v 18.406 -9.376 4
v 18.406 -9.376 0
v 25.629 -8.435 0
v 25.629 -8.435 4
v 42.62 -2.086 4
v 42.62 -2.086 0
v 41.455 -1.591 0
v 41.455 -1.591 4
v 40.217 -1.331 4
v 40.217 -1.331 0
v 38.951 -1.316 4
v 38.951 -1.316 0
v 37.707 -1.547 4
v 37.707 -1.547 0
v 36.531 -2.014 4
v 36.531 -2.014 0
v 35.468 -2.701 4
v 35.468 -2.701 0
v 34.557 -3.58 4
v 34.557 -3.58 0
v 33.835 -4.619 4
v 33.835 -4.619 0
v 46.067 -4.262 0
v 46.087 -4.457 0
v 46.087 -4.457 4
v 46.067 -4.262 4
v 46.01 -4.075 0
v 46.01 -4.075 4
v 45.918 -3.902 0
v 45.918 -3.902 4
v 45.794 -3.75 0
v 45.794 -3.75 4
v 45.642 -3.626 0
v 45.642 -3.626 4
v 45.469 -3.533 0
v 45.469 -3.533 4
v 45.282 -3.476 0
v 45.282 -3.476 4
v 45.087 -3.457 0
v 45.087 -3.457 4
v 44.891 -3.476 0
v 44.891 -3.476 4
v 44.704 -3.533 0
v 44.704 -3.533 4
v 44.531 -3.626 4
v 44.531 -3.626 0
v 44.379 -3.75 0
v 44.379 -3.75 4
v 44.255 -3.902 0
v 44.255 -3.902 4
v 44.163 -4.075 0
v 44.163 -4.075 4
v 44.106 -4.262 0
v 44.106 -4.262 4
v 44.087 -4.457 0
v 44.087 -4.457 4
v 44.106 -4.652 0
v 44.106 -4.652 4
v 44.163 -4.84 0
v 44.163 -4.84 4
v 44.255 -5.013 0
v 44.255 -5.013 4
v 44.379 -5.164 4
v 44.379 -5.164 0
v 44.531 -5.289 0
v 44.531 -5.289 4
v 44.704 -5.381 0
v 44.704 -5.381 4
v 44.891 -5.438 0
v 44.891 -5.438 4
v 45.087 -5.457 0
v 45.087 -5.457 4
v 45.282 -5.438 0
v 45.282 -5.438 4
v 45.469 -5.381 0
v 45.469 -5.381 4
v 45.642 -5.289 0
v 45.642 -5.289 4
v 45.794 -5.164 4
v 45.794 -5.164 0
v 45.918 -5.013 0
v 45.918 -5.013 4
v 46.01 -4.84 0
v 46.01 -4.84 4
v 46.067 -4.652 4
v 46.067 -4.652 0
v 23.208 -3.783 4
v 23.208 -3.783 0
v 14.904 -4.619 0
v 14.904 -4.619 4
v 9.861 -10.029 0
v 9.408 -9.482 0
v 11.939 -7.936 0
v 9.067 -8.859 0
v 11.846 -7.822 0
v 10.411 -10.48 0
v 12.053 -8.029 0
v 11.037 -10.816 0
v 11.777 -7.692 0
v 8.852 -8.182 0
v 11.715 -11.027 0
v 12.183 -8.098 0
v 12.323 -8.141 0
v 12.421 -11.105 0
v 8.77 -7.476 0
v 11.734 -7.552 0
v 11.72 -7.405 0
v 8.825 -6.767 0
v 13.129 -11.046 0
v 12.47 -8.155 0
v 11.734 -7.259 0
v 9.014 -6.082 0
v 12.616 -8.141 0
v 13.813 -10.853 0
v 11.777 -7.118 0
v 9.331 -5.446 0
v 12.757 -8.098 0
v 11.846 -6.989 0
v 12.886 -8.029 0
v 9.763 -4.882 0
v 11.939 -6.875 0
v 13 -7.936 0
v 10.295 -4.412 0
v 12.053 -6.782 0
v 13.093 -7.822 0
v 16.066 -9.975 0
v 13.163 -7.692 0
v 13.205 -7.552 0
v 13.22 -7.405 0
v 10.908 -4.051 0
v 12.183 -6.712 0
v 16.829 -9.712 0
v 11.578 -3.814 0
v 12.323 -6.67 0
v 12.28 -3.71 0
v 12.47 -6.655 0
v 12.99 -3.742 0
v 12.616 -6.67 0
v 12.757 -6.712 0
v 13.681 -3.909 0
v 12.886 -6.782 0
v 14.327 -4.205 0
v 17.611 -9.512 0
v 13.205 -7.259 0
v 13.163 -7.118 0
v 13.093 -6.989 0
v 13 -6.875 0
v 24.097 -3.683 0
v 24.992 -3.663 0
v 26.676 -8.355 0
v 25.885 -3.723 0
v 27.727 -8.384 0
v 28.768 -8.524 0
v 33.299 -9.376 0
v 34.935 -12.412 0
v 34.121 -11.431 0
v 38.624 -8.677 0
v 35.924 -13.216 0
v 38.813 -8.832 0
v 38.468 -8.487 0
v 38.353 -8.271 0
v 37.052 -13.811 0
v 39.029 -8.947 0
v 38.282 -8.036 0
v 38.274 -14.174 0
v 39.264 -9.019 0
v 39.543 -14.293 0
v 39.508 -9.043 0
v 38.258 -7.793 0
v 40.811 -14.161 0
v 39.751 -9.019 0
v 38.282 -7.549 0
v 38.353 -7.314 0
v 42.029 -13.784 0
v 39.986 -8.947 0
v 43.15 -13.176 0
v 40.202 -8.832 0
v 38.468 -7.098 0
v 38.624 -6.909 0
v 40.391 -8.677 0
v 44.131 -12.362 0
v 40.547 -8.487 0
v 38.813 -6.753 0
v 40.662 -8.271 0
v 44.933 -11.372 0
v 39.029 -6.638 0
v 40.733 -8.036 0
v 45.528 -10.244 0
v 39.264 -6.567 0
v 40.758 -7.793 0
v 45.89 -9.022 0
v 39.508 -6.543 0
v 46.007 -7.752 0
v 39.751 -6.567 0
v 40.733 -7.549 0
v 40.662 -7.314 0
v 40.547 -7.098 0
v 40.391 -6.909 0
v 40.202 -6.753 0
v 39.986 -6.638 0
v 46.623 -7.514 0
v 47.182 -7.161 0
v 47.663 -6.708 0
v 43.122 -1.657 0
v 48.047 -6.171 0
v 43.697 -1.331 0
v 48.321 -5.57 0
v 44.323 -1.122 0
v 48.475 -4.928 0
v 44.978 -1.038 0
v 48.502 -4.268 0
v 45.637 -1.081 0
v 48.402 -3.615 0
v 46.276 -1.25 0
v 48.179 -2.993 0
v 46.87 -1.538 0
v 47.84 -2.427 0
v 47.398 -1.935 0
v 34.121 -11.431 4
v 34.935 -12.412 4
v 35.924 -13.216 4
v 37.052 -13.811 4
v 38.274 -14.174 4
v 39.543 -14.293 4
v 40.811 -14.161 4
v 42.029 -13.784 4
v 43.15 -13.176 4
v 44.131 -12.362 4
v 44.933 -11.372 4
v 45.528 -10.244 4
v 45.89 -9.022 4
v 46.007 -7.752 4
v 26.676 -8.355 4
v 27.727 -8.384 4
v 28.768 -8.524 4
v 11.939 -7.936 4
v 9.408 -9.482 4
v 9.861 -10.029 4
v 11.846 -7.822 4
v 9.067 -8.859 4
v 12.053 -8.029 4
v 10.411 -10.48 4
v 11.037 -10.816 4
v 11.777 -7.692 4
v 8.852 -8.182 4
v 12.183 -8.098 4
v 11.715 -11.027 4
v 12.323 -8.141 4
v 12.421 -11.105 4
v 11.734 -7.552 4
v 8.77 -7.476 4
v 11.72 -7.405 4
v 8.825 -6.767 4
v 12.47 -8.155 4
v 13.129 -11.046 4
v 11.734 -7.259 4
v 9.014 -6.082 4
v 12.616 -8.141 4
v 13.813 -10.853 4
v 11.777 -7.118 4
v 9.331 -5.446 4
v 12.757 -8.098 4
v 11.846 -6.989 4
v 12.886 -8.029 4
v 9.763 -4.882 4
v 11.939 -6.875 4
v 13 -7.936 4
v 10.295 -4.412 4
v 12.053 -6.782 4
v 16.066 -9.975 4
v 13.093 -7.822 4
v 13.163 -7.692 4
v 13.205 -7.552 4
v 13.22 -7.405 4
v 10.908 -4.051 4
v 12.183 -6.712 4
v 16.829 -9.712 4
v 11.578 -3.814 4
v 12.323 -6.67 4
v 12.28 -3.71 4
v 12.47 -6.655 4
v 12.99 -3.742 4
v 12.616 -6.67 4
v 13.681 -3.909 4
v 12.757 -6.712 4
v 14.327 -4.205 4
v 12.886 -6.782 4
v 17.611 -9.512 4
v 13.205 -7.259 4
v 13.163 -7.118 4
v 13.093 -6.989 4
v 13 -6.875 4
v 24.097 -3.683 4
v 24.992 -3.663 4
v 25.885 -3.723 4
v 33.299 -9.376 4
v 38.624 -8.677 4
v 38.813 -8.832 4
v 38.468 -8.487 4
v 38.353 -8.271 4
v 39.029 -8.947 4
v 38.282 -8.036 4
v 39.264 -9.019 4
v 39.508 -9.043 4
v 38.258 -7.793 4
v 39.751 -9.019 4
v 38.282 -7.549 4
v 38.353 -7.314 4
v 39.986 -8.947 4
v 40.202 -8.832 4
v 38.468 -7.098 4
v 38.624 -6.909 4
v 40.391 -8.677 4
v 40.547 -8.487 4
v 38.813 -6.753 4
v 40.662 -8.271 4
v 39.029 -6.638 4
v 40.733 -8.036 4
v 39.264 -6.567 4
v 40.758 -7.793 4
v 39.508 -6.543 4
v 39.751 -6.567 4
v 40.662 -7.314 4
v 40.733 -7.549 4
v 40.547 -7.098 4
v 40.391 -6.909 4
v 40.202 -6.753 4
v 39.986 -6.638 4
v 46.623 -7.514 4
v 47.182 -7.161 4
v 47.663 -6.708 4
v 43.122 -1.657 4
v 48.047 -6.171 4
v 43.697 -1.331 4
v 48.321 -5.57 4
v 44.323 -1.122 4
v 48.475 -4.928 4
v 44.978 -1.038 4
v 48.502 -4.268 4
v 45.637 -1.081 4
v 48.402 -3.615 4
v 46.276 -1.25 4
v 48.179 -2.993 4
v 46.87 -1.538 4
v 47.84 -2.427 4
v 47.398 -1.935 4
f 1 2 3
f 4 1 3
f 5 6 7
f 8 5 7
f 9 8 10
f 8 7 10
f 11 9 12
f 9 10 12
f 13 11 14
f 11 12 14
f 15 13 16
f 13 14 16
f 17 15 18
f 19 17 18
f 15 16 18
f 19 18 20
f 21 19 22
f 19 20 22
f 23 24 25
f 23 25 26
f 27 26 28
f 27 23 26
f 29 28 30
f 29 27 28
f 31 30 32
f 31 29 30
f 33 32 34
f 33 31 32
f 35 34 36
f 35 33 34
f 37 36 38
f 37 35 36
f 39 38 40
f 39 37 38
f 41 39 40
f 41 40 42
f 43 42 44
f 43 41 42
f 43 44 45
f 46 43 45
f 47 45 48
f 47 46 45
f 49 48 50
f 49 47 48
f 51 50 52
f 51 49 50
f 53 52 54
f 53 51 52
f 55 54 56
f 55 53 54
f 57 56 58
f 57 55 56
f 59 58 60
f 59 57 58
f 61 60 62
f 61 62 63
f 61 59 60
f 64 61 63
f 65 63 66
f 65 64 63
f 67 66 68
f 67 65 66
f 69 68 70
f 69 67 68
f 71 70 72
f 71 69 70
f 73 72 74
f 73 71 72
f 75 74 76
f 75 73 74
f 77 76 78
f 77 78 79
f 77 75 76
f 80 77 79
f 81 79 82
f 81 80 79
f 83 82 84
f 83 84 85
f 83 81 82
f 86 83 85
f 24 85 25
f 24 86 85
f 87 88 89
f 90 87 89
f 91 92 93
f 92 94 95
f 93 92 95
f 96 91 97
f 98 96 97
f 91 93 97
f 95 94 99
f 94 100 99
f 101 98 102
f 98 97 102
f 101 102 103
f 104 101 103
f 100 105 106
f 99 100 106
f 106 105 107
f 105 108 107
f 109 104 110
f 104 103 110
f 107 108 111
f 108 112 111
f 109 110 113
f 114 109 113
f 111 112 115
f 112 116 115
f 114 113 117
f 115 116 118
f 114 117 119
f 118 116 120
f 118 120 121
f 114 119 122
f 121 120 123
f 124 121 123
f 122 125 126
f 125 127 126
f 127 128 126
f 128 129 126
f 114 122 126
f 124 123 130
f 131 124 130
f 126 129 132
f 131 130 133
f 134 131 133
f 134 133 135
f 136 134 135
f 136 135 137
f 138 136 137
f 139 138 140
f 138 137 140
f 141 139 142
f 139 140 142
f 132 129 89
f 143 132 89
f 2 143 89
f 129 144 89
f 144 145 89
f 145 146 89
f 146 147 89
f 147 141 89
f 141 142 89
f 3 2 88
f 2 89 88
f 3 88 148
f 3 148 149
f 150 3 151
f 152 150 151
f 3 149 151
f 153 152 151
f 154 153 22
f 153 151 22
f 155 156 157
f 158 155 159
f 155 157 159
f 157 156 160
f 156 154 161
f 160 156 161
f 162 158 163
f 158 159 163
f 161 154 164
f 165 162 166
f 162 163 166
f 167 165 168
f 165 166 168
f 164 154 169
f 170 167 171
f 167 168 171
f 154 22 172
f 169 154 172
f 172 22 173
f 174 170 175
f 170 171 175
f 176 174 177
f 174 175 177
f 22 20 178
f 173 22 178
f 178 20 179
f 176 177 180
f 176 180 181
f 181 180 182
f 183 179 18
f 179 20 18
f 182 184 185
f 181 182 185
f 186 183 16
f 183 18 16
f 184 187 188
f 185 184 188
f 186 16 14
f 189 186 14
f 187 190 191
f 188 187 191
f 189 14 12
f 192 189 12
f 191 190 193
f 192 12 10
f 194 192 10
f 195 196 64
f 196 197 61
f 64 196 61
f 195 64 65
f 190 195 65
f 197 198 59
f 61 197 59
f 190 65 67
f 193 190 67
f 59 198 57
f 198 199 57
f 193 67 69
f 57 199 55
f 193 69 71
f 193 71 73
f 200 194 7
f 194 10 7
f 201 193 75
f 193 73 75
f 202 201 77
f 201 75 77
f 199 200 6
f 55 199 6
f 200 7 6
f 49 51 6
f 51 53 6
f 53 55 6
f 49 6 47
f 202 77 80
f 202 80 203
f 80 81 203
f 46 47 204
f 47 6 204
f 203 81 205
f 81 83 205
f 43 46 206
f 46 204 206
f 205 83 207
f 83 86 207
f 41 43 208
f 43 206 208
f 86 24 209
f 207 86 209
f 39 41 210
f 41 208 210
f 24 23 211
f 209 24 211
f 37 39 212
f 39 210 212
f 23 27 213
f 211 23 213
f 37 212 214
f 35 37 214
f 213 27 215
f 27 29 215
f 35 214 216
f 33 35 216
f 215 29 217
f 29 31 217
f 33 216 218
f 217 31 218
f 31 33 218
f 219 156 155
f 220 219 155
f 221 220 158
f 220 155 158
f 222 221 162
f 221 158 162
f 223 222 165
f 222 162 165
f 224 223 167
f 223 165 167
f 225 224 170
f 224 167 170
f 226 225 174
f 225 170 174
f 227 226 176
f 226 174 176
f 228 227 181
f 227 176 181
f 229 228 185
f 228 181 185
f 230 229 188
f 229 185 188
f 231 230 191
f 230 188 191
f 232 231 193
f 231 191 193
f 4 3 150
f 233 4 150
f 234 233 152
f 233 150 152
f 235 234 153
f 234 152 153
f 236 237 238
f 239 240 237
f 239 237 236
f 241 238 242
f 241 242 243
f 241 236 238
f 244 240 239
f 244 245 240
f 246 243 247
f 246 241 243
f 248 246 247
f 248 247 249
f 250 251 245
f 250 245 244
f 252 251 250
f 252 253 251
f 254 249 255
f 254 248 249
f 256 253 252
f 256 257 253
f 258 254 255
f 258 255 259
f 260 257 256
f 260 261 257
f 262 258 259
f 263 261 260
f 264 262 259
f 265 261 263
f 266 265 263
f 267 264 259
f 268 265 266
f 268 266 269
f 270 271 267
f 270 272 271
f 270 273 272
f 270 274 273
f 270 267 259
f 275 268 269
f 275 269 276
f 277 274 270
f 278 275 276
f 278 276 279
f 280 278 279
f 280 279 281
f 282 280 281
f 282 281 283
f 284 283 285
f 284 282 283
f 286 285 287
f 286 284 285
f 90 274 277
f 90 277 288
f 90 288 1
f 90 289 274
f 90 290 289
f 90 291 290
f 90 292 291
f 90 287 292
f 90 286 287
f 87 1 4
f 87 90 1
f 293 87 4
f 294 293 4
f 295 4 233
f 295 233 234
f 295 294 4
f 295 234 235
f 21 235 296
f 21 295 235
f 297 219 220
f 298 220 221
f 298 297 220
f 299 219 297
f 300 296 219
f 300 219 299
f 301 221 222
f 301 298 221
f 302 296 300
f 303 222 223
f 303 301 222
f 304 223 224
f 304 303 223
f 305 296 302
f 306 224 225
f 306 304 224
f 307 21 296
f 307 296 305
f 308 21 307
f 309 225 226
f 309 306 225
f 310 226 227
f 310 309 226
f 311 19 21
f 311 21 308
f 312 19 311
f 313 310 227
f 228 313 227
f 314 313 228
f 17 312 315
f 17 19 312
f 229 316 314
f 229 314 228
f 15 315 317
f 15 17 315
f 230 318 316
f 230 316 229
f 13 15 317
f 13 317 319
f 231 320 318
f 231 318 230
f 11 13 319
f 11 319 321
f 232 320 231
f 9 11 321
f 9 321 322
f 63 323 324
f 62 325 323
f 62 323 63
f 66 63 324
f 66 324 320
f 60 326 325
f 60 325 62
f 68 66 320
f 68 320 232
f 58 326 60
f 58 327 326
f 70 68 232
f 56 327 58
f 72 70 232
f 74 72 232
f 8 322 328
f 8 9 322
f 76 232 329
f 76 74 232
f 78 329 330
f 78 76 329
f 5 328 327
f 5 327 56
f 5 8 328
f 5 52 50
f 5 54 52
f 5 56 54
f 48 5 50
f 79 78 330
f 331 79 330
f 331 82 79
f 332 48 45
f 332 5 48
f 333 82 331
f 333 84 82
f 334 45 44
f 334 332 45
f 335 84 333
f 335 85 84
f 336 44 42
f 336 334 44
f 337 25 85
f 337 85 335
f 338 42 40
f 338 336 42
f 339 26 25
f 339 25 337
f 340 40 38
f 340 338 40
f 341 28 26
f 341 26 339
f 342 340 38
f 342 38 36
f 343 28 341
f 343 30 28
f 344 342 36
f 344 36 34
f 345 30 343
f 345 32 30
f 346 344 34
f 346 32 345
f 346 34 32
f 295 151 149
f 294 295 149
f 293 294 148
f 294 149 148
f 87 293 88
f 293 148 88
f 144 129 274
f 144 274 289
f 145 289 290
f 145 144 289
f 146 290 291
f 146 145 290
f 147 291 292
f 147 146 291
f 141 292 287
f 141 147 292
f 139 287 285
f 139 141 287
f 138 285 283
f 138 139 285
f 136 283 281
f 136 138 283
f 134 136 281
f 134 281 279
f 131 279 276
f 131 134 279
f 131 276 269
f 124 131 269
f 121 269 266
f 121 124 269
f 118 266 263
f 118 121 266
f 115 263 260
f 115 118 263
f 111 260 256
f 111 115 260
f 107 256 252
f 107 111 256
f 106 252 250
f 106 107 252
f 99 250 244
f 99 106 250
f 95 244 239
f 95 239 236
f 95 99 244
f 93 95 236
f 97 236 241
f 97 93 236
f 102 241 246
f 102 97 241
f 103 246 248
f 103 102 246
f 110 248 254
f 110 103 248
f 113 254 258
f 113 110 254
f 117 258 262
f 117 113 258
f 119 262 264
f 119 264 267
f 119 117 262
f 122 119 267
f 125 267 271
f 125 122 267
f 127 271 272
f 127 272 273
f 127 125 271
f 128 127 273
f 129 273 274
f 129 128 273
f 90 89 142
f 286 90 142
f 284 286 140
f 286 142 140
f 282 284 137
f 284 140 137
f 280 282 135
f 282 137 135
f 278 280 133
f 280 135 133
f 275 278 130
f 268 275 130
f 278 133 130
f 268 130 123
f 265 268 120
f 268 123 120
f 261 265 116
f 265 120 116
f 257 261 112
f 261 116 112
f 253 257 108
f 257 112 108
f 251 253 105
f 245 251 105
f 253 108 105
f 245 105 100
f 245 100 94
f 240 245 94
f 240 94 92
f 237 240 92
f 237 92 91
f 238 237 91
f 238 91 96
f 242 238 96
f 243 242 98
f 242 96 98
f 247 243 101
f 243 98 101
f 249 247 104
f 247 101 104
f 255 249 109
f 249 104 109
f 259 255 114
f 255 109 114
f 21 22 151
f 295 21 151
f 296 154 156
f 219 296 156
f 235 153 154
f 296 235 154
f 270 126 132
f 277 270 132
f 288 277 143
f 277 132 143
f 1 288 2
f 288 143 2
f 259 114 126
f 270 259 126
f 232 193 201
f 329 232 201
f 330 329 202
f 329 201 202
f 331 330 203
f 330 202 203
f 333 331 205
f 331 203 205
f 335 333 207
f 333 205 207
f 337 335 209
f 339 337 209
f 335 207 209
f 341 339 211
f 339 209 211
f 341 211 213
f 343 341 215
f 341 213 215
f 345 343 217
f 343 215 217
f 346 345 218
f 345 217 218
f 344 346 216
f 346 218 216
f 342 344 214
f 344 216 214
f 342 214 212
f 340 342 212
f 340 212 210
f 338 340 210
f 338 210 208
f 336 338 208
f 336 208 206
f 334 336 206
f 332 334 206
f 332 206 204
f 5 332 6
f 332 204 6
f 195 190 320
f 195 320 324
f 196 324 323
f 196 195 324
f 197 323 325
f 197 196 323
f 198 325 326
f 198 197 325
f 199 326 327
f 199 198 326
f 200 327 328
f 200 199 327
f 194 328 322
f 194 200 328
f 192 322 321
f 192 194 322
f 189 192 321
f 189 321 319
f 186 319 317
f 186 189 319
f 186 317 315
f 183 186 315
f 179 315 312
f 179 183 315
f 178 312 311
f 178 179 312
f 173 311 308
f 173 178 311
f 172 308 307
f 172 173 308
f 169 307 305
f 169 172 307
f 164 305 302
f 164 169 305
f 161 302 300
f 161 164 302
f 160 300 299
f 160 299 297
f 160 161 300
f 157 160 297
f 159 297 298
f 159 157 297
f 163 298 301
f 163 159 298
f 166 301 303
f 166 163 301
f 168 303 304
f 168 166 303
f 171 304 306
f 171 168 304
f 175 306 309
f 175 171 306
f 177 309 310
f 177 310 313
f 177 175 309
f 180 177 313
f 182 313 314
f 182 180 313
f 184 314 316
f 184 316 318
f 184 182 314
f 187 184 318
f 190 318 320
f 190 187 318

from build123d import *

# Parameters (mm, degrees)
SKETCH1_R           = 0.75
SKETCH1_R_2         = 1.25
SKETCH1_R_3         = 1
BOSS_EXTRUDE2_DEPTH = 4


with BuildPart() as part:
    # Sketch1 → Boss-Extrude2 (new body)
    with BuildSketch(Plane.XY):
        with BuildLine():
            Line((18.405783089, -9.376058657), (25.628644526, -8.435404146))
            ThreePointArc((25.628644526, -8.435404146), (27.202023368, -8.355640481), (28.768404416, -8.523966464))
            Line((28.768404416, -8.523966464), (33.299022581, -9.376058657))
            Line((33.299022581, -9.376058657), (34.120905067, -11.430554242))
            ThreePointArc((34.120905067, -11.430554242), (41.429155101, -14.002085417), (46.007385343, -7.752037497))
            ThreePointArc((46.007385343, -7.752037497), (48.022828461, -2.701791829), (42.620210155, -2.0863995))
            ThreePointArc((42.620210155, -2.0863995), (37.707004122, -1.546981728), (33.834920639, -4.619038785))
            Line((33.834920639, -4.619038785), (25.885206346, -3.723470434))
            ThreePointArc((25.885206346, -3.723470434), (24.544626829, -3.66305828), (23.20802923, -3.782682405))
            Line((23.20802923, -3.782682405), (14.904254879, -4.619038785))
            ThreePointArc((14.904254879, -4.619038785), (8.82513363, -6.767310768), (13.813095481, -10.852775766))
            Line((13.813095481, -10.852775766), (16.06646506, -9.974716914))
            ThreePointArc((16.06646506, -9.974716914), (17.21798795, -9.604519035), (18.405783089, -9.376058657))
        make_face()
        with Locations((12.469720998, -7.405262894)):
            Circle(SKETCH1_R, mode=Mode.SUBTRACT)
        with Locations((39.507512119, -7.792633892)):
            Circle(SKETCH1_R_2, mode=Mode.SUBTRACT)
        with Locations((45.086512481, -4.457254609)):
            Circle(SKETCH1_R_3, mode=Mode.SUBTRACT)
    extrude(amount=BOSS_EXTRUDE2_DEPTH)


solid = part.part
